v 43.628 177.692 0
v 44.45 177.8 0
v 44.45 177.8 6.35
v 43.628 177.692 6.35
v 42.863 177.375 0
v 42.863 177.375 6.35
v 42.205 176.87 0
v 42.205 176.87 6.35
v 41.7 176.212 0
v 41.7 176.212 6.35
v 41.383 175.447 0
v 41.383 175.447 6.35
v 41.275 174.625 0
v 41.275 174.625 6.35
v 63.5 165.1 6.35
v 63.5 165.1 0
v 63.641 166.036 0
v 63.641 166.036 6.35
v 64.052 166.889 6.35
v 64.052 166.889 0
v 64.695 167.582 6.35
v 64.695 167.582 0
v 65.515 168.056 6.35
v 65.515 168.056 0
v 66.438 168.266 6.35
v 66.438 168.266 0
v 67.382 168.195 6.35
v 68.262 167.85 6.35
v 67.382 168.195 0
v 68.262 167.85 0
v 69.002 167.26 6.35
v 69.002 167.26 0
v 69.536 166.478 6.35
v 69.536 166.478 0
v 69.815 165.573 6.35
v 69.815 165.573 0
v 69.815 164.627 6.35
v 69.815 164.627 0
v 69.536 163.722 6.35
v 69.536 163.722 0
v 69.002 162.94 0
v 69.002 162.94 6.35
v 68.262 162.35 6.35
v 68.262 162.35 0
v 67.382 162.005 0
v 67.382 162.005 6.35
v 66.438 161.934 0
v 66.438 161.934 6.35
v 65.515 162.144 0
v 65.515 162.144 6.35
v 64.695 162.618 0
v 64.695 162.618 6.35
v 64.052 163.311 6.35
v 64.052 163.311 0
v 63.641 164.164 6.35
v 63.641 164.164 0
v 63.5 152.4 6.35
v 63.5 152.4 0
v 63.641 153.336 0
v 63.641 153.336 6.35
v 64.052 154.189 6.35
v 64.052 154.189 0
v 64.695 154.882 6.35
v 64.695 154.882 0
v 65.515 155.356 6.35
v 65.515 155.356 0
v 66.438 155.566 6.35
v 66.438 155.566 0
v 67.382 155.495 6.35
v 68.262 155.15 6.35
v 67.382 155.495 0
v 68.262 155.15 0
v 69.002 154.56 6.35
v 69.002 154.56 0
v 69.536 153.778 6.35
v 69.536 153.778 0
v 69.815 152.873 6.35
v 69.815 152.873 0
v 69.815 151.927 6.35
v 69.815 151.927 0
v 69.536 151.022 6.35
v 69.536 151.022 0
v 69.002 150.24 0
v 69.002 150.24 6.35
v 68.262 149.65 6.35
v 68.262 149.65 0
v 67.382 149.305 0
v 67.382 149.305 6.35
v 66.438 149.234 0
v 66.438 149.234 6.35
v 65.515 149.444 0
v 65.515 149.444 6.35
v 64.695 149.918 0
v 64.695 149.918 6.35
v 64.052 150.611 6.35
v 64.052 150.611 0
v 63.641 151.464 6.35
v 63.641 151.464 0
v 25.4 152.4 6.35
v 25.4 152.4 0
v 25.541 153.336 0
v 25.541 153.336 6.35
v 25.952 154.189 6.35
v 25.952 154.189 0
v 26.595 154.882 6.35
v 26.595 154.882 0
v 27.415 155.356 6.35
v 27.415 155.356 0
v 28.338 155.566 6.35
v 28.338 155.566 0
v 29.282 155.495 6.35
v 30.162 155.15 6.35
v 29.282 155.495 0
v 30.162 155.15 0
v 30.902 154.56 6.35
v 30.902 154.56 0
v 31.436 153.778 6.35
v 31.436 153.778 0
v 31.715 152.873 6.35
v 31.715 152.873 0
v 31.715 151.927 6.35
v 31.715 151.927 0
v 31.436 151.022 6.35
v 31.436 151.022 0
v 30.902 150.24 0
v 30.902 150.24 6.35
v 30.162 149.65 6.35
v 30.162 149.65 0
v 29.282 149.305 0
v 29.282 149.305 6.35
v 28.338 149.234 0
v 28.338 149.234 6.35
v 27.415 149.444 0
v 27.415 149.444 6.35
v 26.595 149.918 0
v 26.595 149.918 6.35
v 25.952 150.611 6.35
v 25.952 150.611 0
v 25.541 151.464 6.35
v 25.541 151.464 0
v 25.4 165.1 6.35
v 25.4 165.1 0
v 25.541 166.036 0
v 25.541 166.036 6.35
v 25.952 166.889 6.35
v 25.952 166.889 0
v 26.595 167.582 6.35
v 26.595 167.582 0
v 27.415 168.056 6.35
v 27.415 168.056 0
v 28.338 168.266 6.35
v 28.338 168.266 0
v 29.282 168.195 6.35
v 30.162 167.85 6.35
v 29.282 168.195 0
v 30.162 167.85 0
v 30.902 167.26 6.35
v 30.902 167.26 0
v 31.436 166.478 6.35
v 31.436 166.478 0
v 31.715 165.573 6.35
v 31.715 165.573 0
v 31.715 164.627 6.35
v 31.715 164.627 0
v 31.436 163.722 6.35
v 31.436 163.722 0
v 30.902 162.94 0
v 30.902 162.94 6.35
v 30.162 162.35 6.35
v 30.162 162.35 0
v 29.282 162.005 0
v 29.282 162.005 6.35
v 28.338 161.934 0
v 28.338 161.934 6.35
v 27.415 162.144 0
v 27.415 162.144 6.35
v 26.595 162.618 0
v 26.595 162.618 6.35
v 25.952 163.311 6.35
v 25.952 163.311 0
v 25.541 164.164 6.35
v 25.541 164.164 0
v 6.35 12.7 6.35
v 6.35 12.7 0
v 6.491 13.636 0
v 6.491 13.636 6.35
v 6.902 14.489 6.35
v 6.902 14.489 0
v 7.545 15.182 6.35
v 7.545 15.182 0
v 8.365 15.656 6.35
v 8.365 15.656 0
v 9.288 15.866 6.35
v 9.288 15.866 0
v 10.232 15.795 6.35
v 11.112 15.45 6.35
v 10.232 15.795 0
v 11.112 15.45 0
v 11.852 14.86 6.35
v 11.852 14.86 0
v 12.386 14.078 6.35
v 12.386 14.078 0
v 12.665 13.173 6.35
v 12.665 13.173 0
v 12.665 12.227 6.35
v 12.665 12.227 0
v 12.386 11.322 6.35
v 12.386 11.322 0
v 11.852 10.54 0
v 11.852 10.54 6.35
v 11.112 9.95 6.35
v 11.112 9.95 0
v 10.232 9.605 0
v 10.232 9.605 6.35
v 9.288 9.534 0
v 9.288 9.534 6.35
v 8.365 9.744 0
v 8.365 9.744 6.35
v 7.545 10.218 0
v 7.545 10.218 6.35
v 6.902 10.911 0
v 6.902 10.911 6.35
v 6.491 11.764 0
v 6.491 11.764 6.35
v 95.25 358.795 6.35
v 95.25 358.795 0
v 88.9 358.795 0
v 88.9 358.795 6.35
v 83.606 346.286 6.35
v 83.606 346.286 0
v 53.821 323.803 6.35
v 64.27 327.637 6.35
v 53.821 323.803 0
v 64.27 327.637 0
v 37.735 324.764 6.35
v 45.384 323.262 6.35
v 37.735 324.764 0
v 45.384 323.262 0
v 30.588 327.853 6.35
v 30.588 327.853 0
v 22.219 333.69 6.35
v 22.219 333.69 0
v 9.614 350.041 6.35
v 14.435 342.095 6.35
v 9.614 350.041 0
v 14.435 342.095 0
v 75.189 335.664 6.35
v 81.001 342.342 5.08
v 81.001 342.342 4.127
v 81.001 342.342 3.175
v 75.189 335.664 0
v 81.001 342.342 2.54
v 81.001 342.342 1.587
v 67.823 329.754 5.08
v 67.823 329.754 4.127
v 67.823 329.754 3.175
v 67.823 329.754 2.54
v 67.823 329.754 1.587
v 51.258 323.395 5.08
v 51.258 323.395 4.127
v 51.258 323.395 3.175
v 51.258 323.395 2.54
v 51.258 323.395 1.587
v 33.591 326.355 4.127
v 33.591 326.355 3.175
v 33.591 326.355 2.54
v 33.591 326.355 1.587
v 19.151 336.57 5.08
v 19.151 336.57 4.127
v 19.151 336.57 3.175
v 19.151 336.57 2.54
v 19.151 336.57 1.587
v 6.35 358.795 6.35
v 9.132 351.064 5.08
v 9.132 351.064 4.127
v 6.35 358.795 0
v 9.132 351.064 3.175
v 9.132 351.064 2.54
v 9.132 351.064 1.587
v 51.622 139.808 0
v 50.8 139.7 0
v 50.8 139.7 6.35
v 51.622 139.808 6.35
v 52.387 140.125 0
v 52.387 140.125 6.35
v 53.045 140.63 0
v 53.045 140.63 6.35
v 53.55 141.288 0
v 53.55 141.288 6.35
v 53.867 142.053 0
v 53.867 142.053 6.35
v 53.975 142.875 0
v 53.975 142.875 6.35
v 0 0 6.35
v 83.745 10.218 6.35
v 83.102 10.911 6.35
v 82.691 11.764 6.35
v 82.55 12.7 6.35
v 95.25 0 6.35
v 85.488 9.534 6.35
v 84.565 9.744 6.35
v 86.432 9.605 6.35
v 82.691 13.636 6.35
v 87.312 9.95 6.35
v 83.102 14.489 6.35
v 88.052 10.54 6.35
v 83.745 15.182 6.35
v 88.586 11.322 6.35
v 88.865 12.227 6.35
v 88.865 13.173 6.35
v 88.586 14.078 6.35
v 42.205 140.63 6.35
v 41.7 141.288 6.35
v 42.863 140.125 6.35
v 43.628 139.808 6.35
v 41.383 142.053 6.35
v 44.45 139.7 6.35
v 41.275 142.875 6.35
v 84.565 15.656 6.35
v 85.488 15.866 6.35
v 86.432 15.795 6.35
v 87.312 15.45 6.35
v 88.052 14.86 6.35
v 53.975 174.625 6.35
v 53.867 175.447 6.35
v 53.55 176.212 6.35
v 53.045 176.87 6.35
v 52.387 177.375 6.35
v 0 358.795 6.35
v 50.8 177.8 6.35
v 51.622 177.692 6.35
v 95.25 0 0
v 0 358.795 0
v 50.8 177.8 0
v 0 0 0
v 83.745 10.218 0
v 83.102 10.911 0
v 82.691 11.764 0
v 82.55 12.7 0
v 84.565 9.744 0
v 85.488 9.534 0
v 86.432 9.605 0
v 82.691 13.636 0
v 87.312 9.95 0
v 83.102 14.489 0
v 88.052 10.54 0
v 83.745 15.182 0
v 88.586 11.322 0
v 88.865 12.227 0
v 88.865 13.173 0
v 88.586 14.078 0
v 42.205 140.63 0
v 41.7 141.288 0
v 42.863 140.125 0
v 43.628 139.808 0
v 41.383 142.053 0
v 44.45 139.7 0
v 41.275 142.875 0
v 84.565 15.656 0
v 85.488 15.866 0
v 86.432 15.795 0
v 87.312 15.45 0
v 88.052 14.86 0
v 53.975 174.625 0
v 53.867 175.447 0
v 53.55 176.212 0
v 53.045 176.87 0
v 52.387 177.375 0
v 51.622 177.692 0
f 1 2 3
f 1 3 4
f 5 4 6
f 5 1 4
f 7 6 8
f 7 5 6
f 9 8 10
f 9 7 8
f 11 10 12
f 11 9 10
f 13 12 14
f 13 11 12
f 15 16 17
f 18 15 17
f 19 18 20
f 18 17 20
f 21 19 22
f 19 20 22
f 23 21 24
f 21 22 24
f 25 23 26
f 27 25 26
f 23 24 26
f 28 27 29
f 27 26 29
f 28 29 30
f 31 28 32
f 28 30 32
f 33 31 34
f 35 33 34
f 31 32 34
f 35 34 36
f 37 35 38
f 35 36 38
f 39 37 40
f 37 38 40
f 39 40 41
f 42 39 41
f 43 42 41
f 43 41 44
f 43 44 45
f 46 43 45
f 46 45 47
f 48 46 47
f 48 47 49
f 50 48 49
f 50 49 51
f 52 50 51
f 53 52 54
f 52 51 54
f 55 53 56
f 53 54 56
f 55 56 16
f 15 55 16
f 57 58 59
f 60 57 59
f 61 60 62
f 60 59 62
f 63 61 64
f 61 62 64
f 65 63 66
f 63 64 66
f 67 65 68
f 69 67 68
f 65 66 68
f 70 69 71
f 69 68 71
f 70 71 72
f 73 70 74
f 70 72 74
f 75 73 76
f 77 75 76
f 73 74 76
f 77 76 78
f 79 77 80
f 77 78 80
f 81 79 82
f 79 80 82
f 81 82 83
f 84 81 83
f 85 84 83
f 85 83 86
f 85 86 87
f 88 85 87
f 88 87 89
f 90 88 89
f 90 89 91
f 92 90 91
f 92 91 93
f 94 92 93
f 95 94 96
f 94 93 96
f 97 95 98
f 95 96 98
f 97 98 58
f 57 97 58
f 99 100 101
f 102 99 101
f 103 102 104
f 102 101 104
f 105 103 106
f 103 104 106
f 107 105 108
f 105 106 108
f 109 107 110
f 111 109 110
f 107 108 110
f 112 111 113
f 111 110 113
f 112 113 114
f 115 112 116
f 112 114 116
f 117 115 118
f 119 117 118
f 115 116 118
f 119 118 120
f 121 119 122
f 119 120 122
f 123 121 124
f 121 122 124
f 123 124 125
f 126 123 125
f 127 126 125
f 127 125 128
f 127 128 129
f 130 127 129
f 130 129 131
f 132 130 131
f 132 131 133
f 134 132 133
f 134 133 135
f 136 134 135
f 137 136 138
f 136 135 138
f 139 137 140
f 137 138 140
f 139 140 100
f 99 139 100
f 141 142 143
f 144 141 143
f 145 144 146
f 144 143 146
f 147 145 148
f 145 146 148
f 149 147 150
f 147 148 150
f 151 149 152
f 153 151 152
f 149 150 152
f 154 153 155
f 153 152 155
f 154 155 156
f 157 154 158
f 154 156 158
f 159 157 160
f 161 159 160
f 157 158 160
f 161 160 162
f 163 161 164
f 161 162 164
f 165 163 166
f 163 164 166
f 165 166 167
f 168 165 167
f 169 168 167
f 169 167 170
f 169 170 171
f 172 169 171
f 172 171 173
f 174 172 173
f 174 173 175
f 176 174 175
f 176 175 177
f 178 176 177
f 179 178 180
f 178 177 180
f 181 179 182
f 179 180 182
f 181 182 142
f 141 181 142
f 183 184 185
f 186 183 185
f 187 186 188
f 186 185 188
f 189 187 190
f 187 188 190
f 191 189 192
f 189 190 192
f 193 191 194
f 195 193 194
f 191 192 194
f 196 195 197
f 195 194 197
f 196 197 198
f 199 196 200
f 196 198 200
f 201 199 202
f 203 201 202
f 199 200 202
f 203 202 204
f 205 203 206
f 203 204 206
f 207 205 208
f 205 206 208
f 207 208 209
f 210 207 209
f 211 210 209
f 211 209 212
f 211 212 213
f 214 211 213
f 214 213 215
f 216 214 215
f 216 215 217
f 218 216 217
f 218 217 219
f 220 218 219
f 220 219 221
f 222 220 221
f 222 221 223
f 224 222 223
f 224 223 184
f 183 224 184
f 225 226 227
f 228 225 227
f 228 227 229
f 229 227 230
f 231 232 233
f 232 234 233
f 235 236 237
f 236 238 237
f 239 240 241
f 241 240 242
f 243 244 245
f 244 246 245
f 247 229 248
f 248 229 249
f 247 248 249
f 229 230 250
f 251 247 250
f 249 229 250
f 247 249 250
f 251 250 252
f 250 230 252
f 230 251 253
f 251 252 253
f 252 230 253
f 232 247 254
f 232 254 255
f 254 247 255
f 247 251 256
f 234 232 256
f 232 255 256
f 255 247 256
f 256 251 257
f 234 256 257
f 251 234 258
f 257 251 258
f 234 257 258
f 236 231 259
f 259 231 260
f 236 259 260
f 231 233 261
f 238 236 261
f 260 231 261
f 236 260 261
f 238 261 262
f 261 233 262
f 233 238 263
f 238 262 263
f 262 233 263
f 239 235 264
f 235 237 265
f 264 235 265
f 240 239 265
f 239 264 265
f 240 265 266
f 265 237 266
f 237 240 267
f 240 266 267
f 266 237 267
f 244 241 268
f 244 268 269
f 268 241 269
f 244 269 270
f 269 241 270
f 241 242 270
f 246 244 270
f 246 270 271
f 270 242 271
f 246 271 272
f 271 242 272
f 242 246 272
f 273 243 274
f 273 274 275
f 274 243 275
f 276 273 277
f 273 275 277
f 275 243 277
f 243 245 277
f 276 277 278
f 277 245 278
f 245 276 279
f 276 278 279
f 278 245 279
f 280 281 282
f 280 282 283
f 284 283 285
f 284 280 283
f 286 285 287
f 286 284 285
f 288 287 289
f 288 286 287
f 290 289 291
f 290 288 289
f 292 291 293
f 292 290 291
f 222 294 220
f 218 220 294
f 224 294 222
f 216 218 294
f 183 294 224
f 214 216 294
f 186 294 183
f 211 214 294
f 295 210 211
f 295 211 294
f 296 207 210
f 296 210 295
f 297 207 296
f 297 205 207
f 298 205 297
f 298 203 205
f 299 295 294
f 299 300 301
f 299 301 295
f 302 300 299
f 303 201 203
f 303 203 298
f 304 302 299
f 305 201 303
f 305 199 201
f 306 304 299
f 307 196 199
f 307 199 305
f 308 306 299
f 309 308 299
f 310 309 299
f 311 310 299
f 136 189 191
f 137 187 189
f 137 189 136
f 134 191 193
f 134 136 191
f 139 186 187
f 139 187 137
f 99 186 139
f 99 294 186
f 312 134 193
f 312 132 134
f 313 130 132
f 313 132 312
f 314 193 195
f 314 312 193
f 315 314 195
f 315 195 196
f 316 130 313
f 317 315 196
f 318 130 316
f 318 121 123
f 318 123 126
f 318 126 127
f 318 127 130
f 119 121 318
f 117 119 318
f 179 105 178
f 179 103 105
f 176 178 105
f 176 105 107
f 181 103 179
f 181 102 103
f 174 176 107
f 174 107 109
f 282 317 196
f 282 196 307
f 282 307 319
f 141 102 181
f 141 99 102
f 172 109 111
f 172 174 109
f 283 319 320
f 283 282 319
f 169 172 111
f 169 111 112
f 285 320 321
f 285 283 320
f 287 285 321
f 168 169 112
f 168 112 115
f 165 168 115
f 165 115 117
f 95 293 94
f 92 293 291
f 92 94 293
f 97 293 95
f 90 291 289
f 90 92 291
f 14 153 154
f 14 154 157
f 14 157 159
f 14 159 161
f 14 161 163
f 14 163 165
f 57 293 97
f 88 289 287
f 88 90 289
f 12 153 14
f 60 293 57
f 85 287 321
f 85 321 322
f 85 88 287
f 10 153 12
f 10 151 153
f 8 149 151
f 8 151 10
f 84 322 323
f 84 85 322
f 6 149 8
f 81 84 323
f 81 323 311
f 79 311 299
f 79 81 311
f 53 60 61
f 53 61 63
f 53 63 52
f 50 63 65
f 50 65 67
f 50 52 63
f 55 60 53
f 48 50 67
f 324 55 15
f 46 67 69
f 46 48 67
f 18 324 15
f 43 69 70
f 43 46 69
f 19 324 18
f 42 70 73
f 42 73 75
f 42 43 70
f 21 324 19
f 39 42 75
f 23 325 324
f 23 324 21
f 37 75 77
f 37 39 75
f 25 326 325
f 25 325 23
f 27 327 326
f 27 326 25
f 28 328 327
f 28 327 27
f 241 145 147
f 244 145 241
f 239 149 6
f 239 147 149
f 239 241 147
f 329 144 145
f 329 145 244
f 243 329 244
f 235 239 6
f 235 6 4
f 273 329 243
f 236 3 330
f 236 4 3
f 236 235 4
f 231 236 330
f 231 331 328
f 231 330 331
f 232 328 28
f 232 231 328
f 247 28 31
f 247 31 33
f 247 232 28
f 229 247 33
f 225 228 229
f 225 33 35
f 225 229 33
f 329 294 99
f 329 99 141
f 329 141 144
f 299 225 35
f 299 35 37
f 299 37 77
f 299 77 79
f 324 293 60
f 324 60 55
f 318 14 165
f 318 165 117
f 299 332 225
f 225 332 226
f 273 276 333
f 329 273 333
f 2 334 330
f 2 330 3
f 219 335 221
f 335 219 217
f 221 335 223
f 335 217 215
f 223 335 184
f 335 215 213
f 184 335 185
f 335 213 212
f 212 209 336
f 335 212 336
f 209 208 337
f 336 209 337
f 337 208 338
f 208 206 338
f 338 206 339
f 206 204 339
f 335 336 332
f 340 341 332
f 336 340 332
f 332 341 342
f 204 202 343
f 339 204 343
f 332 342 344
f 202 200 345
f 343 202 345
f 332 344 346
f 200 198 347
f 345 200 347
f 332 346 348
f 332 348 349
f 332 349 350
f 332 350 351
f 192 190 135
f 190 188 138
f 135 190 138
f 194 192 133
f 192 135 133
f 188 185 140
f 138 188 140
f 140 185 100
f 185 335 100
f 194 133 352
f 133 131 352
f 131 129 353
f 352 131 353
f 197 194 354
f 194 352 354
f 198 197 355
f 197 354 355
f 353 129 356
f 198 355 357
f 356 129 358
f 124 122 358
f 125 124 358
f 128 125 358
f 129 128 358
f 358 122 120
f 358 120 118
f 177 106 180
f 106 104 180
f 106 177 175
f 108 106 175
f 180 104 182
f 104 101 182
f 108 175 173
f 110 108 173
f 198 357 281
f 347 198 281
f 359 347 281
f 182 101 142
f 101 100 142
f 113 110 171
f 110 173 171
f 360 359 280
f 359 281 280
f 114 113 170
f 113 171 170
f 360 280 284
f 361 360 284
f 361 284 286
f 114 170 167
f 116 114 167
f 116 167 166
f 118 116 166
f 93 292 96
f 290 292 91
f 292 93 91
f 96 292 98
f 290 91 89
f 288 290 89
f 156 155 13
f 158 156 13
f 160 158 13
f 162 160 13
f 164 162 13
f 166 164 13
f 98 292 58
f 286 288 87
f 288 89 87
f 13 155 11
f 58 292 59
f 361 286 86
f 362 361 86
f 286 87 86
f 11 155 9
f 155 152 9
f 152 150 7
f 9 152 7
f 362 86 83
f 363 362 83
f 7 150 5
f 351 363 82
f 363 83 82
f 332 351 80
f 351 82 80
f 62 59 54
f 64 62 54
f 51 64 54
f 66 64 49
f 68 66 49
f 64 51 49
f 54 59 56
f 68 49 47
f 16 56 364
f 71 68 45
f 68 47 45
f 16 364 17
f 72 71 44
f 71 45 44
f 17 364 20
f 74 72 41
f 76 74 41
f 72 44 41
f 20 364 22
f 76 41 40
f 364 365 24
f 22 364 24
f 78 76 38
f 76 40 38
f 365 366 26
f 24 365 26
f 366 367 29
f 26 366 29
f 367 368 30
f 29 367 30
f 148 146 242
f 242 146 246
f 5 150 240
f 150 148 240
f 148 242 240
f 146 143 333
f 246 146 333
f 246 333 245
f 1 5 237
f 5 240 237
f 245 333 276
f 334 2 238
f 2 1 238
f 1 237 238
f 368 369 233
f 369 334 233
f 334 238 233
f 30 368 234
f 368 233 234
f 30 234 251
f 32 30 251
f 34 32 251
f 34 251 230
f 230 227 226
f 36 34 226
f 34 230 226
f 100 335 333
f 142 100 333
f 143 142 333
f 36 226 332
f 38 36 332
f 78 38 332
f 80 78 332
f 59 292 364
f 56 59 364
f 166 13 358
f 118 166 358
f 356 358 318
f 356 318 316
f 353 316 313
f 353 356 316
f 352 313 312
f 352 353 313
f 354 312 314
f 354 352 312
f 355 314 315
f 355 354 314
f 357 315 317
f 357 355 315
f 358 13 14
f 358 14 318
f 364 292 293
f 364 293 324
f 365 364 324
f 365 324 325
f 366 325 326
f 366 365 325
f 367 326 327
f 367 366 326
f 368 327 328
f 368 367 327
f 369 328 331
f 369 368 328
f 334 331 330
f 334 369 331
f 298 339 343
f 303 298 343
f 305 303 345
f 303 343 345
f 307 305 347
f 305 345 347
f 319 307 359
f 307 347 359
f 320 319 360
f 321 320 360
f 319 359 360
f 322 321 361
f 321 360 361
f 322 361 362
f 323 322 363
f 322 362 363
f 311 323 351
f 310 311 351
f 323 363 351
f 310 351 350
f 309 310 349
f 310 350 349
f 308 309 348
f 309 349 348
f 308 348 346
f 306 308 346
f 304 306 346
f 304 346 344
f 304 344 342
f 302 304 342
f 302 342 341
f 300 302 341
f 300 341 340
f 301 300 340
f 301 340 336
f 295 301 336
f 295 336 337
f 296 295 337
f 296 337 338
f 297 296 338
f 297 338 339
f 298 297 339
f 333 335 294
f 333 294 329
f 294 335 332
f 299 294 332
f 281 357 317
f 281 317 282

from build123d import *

# Parameters (mm, degrees)
SKETCH1_W           = 95.25
SKETCH1_H           = 406.4
BOSS_EXTRUDE1_DEPTH = 6.35
CUT_EXTRUDE1_DEPTH  = 6.35
SKETCH3_R           = 3.175
CUT_EXTRUDE2_DEPTH  = 6.35
SKETCH4_R           = 3.175
CUT_EXTRUDE3_DEPTH  = 7.3500001


with BuildPart() as part:
    # Sketch1 → Boss-Extrude1 (new body)
    with BuildSketch(Plane.XY):
        with Locations((47.625, 203.2)):
            Rectangle(SKETCH1_W, SKETCH1_H)
    extrude(amount=BOSS_EXTRUDE1_DEPTH)

    # Sketch2 → Cut-Extrude1 (cut)
    with BuildSketch(Plane(origin=(0, 0, 0), x_dir=(-1, 0, 0), z_dir=(0, 0, -1))):
        with BuildLine():
            Line((-95.25, 358.795116355), (-88.899916478, 358.795116355))
            add(Edge.make_bspline(
                [(-88.899916478, 358.795116355), (-88.746918957, 358.220859299), (-87.981388016, 355.548098122), (-86.156732479, 350.776147046), (-82.793447186, 344.659309891), (-78.553663698, 339.00035146), (-73.568328984, 333.940394202), (-67.902765315, 329.602048826), (-61.759947665, 326.175234429), (-56.011278232, 324.163968737), (-51.274161129, 323.327012567), (-47.6263932, 323.106329306), (-43.964779676, 323.327682292), (-39.230133038, 324.167914788), (-33.493030626, 326.166537812), (-27.199275842, 329.696450217), (-19.753743135, 335.438425446), (-13.509536081, 342.720425859), (-9.091517456, 350.781784077), (-7.361400097, 355.320896006), (-6.582808256, 357.943053332), (-6.425755246, 358.510985771), (-6.349961226, 358.795396351)],
                knots=[0.244653944, 0.244653944, 0.244653944, 0.244653944, 0.252466444, 0.28125, 0.3125, 0.34375, 0.375, 0.40625, 0.4375, 0.46875, 0.484375, 0.5, 0.515625, 0.53125, 0.5625, 0.59375, 0.625, 0.6875, 0.71875, 0.747082052, 0.750988302, 0.754894552, 0.754894552, 0.754894552, 0.754894552], degree=3))
            Line((-6.349961226, 358.795396351), (0, 358.795396351))
            Line((0, 358.795396351), (0, 406.4))
            Line((0, 406.4), (-95.25, 406.4))
            Line((-95.25, 406.4), (-95.25, 358.795116355))
        make_face()
    extrude(amount=-CUT_EXTRUDE1_DEPTH, mode=Mode.SUBTRACT)

    # Sketch3 → Cut-Extrude2 (cut)
    with BuildSketch(Plane(origin=(0, 0, 0), x_dir=(-1, 0, 0), z_dir=(0, 0, -1))):
        with Locations((-28.575, 165.1)):
            Circle(SKETCH3_R)
        with Locations((-66.675, 165.1)):
            Circle(SKETCH3_R)
        with Locations((-66.675, 152.4)):
            Circle(SKETCH3_R)
        with Locations((-28.575, 152.4)):
            Circle(SKETCH3_R)
        with BuildLine():
            Line((-50.8, 177.8), (-44.45, 177.8))
            ThreePointArc((-44.45, 177.8), (-42.20493597, 176.87006403), (-41.275, 174.625))
            Line((-41.275, 174.625), (-41.275, 142.875))
            ThreePointArc((-41.275, 142.875), (-42.20493597, 140.62993597), (-44.45, 139.7))
            Line((-44.45, 139.7), (-50.8, 139.7))
            ThreePointArc((-50.8, 139.7), (-53.04506403, 140.62993597), (-53.975, 142.875))
            Line((-53.975, 142.875), (-53.975, 174.625))
            ThreePointArc((-53.975, 174.625), (-53.04506403, 176.87006403), (-50.8, 177.8))
        make_face()
    extrude(amount=-CUT_EXTRUDE2_DEPTH, mode=Mode.SUBTRACT)

    # Sketch4 → Cut-Extrude3 (cut, through all)
    with BuildSketch(Plane(origin=(0, 0, 0), x_dir=(-1, 0, 0), z_dir=(0, 0, -1))):
        with Locations((-9.525, 12.7)):
            Circle(SKETCH4_R)
        with Locations((-85.725, 12.7)):
            Circle(SKETCH4_R)
    extrude(amount=-CUT_EXTRUDE3_DEPTH, mode=Mode.SUBTRACT)


solid = part.part
